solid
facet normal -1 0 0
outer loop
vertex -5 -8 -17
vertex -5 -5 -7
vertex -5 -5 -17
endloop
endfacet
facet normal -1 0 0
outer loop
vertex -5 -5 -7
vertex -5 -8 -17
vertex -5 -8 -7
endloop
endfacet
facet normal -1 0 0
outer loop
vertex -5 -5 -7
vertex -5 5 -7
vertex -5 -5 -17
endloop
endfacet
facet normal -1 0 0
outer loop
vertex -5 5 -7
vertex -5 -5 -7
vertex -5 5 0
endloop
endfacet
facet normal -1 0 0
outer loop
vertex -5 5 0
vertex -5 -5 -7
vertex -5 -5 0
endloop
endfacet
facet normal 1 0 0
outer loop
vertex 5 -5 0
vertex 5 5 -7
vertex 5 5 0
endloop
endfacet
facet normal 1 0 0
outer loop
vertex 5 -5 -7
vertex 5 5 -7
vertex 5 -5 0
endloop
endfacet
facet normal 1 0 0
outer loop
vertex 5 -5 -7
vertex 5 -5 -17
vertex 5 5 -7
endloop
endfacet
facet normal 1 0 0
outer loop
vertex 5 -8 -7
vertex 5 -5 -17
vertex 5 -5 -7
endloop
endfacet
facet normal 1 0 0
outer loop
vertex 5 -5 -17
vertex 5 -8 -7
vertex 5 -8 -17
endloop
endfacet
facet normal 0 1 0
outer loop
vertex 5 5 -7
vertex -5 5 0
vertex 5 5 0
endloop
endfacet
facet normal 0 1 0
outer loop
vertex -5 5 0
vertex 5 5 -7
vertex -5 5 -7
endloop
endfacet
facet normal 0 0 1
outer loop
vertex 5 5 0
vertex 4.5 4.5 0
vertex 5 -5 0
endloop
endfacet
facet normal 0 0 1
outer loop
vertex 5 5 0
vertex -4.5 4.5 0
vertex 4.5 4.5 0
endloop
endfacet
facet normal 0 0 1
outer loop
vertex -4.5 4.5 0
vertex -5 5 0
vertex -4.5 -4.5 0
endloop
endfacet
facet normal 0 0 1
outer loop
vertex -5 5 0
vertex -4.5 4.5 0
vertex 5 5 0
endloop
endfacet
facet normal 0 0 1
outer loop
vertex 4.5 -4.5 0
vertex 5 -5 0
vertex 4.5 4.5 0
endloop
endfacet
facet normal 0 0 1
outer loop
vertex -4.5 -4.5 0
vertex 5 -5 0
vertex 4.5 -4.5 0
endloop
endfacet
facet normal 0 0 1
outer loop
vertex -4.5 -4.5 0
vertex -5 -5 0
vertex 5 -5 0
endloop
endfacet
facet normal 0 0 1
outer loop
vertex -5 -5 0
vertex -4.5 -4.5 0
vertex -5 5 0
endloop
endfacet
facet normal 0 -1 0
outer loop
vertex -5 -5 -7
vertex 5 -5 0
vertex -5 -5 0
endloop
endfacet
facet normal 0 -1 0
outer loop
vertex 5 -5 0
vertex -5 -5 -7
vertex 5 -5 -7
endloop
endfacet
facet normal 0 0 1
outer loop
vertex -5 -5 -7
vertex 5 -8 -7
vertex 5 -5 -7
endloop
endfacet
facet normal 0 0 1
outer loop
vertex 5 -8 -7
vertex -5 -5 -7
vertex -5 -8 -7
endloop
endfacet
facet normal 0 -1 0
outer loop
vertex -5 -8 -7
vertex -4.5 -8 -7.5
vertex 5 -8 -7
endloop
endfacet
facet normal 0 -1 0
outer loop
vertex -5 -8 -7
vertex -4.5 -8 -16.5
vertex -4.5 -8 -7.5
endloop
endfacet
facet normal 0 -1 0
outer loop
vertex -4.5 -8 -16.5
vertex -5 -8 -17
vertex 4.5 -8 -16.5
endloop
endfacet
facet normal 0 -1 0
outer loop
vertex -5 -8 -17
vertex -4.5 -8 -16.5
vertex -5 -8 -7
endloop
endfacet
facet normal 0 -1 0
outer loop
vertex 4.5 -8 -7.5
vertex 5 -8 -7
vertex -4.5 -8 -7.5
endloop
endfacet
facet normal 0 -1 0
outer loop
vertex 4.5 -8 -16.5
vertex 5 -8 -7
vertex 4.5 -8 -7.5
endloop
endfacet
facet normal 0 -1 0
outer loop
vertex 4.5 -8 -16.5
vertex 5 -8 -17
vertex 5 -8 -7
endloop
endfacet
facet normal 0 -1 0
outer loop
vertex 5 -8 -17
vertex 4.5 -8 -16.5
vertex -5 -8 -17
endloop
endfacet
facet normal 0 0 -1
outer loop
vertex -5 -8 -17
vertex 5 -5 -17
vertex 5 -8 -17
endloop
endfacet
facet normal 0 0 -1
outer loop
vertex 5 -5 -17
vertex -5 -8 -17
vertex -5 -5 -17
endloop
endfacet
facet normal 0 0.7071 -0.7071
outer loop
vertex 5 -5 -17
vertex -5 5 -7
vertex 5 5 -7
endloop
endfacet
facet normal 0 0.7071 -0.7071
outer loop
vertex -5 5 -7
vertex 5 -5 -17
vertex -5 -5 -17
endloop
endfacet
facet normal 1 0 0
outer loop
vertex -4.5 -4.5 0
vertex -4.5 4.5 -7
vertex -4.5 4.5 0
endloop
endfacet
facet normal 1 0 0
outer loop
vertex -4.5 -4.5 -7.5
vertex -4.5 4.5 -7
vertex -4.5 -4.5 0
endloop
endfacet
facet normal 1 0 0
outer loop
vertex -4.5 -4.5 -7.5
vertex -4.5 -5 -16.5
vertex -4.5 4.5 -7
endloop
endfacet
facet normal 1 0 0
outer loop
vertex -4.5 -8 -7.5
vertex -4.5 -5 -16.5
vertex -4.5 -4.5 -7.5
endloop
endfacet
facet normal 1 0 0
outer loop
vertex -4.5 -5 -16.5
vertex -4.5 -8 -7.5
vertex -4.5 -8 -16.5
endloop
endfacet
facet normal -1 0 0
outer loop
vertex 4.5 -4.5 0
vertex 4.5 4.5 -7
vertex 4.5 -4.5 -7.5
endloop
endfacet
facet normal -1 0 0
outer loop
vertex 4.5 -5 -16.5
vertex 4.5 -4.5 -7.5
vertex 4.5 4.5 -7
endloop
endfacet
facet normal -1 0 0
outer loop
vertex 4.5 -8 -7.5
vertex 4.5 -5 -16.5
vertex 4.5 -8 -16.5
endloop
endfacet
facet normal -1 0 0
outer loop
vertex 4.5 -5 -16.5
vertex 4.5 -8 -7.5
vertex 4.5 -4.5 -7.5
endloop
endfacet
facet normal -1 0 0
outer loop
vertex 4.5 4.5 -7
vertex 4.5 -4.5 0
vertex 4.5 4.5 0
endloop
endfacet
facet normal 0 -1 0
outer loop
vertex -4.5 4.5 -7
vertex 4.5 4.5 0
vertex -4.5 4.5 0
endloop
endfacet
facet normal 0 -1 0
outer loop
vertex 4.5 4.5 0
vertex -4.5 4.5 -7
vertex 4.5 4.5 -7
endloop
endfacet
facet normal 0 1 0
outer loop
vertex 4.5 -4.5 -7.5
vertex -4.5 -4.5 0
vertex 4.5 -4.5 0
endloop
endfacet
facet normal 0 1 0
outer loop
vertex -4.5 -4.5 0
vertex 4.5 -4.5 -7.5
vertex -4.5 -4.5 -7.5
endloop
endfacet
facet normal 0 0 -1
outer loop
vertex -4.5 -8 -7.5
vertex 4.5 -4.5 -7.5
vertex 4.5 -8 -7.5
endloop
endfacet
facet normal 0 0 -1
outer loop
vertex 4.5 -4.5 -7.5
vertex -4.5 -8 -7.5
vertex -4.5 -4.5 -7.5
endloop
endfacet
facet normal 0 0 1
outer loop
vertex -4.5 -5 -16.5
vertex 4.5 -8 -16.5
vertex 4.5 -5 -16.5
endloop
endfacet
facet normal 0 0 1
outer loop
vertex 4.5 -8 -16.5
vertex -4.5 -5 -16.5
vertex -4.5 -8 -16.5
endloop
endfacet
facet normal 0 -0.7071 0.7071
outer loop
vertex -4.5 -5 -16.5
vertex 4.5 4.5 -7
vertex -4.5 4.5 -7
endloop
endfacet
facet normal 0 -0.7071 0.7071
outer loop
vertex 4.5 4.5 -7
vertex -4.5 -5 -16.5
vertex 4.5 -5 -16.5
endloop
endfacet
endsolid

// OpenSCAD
diameter = 10;
horizontal_leg = 3;
vertical_leg = 7;
wall_thickness = 0.5;

module periscope_knee(d=diameter, h=horizontal_leg, v=vertical_leg, w=wall_thickness) {
  translate([-d/2,-(h+d/2),-d-v])
    rotate([90,0,90])
        difference(){
            linear_extrude(d)
                polygon([[0,0], [h,0], [d+h,d], [d+h,d+v],[h,d+v],[h,d],[0,d]]);
            translate([0,0,w])
                linear_extrude(d-w-w)
                    polygon([[-w,w], [h,w], [d+h-w,d], [d+h-w,d+v+w],[h+w,d+v+w],[h+w,d-w],[-w,d-w]]);
    }  
}

periscope_knee();
